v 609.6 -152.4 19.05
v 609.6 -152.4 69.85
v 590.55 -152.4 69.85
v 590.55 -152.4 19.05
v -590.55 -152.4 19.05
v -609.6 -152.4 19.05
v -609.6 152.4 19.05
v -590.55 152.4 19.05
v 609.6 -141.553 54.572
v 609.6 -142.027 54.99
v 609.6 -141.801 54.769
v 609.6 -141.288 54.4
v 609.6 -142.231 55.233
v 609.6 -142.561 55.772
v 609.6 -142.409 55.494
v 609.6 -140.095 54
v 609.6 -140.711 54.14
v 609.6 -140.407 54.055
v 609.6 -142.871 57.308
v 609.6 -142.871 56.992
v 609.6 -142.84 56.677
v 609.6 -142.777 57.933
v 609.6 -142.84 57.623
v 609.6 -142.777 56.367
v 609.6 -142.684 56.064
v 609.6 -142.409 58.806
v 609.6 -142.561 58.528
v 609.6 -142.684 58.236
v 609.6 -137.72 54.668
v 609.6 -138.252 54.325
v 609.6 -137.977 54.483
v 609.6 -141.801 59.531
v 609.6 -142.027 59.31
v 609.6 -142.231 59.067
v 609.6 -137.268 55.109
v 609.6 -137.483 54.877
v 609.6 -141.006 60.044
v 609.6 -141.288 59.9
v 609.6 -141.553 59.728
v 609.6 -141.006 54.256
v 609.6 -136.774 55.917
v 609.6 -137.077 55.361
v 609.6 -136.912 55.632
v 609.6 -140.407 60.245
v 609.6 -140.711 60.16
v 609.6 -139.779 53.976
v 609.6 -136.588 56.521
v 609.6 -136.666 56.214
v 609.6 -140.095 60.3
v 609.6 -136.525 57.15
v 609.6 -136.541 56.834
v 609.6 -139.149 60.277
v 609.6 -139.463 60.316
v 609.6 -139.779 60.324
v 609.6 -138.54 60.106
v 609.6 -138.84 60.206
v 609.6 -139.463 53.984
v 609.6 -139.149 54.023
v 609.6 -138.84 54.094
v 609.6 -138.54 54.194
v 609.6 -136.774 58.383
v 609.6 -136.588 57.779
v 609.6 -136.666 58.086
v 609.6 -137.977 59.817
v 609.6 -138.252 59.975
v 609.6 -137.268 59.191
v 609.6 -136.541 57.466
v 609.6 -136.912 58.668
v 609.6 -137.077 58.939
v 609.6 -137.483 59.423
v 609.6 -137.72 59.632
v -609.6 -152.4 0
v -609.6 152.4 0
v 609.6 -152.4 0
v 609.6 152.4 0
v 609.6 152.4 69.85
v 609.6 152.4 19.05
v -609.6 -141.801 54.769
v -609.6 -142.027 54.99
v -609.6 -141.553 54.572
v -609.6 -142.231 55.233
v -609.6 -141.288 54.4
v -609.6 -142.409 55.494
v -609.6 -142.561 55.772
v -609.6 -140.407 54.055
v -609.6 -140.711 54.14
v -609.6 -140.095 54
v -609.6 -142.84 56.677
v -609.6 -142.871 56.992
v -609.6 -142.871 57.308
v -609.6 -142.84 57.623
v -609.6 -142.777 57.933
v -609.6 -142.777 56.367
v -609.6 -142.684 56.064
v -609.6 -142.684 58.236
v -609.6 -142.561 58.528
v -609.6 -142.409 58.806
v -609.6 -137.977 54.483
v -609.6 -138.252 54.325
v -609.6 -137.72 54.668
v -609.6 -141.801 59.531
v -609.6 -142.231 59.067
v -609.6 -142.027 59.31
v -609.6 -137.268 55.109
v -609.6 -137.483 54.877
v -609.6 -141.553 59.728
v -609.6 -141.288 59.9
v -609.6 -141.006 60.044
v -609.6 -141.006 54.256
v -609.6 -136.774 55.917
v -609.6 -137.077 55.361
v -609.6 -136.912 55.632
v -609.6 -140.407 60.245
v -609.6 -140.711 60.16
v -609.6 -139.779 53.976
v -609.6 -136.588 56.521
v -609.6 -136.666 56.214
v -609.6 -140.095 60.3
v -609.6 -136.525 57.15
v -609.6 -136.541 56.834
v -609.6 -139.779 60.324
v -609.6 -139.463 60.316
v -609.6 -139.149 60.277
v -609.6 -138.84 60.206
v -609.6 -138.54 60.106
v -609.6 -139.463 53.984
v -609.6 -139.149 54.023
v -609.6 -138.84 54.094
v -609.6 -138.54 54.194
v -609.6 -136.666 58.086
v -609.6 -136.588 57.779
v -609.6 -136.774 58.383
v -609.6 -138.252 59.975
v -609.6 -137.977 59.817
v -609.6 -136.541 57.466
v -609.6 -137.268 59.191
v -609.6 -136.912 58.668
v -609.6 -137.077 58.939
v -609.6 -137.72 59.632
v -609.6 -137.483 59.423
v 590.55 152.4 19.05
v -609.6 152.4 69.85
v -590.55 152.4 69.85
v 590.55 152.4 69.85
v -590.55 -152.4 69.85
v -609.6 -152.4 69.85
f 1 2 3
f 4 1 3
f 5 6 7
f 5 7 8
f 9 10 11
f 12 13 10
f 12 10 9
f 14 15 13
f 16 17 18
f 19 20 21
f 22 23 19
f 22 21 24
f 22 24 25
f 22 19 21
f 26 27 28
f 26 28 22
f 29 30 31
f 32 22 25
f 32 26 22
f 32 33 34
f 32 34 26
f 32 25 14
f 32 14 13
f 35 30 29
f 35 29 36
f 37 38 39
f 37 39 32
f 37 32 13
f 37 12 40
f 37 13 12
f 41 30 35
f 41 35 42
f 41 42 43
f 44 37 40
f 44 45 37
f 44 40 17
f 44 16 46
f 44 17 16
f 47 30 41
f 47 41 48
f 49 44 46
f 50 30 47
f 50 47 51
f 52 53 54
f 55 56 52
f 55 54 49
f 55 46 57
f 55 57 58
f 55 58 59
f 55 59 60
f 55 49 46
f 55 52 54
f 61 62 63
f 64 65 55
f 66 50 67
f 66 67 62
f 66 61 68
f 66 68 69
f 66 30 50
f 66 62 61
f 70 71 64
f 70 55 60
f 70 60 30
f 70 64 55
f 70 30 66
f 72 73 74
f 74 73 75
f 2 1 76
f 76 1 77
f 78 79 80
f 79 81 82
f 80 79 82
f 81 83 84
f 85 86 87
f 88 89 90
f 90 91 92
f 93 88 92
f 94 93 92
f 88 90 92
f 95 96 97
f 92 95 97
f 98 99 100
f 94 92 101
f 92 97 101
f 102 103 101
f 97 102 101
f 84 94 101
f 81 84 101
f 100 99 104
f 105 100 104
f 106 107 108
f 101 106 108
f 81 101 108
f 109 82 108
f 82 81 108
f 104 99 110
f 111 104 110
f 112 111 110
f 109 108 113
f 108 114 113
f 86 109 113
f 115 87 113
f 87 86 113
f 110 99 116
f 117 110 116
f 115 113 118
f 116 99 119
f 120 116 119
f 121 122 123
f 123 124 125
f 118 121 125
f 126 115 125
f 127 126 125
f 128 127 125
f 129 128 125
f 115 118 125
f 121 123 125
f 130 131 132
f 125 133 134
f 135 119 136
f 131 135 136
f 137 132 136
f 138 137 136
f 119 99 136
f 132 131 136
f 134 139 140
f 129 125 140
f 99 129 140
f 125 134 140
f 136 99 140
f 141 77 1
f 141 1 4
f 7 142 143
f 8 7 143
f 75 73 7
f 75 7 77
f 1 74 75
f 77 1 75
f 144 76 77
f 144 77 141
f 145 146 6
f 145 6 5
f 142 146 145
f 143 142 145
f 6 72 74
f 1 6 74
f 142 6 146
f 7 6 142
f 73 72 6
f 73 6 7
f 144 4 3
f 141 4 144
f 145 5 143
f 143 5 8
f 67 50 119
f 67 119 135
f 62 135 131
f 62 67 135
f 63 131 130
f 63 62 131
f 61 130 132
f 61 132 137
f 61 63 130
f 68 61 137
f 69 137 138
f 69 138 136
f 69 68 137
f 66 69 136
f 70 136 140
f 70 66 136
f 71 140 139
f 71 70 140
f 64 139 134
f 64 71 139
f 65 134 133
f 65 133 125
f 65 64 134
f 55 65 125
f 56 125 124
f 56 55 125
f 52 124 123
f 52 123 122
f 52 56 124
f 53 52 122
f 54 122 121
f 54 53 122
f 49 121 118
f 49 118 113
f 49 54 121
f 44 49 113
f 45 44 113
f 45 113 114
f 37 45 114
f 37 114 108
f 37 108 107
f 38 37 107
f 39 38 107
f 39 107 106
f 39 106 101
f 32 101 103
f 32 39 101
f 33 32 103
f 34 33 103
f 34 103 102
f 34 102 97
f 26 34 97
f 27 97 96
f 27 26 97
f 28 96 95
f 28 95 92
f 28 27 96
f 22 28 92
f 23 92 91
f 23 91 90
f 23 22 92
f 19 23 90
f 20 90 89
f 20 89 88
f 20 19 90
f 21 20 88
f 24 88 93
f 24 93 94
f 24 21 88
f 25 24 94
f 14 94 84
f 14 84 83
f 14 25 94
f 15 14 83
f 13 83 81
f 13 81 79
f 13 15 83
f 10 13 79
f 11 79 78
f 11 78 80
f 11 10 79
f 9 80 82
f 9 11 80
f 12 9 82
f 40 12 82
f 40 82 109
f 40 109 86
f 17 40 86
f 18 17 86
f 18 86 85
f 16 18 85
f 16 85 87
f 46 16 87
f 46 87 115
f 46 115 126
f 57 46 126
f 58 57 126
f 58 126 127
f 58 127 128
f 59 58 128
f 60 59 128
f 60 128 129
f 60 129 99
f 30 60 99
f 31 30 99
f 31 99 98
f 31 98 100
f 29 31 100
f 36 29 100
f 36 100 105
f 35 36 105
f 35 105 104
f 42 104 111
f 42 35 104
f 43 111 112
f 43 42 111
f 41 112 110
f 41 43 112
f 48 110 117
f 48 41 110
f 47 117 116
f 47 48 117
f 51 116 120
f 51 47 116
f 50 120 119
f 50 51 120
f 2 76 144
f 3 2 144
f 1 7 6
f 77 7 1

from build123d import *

# Parameters (mm, degrees)
F0_W     = 1219.2
F0_H     = 304.8
F1_DEPTH = 19.05
F2_W     = 19.05
F2_H     = 304.8
F3_DEPTH = 50.8
F5_R     = 3.175
F6_DEPTH = 1219.2


with BuildPart() as f1:
    # F0 (on Top) → F1 (new body)
    with BuildSketch(Plane.XY):
        Rectangle(F0_W, F0_H)
    extrude(amount=F1_DEPTH)


with BuildPart() as f3:
    # F2 (on face) → F3 (new body)
    with BuildSketch(Plane.XY.offset(19.05)):
        with Locations((-600.075, 0)):
            Rectangle(F2_W, F2_H)
    extrude(amount=F3_DEPTH)


with BuildPart() as f4_1:
    # F4: instance of F3
    add(f3.part.mirror(Plane.YZ))


with BuildPart() as f6:
    # F5 (on face) → F6 (new body, through all)
    with BuildSketch(Plane.YZ.offset(609.6)):
        with Locations((-139.7, 57.15)):
            Circle(F5_R)
    extrude(amount=-F6_DEPTH)


solid = Compound([f1.part, f3.part, f4_1.part, f6.part])
